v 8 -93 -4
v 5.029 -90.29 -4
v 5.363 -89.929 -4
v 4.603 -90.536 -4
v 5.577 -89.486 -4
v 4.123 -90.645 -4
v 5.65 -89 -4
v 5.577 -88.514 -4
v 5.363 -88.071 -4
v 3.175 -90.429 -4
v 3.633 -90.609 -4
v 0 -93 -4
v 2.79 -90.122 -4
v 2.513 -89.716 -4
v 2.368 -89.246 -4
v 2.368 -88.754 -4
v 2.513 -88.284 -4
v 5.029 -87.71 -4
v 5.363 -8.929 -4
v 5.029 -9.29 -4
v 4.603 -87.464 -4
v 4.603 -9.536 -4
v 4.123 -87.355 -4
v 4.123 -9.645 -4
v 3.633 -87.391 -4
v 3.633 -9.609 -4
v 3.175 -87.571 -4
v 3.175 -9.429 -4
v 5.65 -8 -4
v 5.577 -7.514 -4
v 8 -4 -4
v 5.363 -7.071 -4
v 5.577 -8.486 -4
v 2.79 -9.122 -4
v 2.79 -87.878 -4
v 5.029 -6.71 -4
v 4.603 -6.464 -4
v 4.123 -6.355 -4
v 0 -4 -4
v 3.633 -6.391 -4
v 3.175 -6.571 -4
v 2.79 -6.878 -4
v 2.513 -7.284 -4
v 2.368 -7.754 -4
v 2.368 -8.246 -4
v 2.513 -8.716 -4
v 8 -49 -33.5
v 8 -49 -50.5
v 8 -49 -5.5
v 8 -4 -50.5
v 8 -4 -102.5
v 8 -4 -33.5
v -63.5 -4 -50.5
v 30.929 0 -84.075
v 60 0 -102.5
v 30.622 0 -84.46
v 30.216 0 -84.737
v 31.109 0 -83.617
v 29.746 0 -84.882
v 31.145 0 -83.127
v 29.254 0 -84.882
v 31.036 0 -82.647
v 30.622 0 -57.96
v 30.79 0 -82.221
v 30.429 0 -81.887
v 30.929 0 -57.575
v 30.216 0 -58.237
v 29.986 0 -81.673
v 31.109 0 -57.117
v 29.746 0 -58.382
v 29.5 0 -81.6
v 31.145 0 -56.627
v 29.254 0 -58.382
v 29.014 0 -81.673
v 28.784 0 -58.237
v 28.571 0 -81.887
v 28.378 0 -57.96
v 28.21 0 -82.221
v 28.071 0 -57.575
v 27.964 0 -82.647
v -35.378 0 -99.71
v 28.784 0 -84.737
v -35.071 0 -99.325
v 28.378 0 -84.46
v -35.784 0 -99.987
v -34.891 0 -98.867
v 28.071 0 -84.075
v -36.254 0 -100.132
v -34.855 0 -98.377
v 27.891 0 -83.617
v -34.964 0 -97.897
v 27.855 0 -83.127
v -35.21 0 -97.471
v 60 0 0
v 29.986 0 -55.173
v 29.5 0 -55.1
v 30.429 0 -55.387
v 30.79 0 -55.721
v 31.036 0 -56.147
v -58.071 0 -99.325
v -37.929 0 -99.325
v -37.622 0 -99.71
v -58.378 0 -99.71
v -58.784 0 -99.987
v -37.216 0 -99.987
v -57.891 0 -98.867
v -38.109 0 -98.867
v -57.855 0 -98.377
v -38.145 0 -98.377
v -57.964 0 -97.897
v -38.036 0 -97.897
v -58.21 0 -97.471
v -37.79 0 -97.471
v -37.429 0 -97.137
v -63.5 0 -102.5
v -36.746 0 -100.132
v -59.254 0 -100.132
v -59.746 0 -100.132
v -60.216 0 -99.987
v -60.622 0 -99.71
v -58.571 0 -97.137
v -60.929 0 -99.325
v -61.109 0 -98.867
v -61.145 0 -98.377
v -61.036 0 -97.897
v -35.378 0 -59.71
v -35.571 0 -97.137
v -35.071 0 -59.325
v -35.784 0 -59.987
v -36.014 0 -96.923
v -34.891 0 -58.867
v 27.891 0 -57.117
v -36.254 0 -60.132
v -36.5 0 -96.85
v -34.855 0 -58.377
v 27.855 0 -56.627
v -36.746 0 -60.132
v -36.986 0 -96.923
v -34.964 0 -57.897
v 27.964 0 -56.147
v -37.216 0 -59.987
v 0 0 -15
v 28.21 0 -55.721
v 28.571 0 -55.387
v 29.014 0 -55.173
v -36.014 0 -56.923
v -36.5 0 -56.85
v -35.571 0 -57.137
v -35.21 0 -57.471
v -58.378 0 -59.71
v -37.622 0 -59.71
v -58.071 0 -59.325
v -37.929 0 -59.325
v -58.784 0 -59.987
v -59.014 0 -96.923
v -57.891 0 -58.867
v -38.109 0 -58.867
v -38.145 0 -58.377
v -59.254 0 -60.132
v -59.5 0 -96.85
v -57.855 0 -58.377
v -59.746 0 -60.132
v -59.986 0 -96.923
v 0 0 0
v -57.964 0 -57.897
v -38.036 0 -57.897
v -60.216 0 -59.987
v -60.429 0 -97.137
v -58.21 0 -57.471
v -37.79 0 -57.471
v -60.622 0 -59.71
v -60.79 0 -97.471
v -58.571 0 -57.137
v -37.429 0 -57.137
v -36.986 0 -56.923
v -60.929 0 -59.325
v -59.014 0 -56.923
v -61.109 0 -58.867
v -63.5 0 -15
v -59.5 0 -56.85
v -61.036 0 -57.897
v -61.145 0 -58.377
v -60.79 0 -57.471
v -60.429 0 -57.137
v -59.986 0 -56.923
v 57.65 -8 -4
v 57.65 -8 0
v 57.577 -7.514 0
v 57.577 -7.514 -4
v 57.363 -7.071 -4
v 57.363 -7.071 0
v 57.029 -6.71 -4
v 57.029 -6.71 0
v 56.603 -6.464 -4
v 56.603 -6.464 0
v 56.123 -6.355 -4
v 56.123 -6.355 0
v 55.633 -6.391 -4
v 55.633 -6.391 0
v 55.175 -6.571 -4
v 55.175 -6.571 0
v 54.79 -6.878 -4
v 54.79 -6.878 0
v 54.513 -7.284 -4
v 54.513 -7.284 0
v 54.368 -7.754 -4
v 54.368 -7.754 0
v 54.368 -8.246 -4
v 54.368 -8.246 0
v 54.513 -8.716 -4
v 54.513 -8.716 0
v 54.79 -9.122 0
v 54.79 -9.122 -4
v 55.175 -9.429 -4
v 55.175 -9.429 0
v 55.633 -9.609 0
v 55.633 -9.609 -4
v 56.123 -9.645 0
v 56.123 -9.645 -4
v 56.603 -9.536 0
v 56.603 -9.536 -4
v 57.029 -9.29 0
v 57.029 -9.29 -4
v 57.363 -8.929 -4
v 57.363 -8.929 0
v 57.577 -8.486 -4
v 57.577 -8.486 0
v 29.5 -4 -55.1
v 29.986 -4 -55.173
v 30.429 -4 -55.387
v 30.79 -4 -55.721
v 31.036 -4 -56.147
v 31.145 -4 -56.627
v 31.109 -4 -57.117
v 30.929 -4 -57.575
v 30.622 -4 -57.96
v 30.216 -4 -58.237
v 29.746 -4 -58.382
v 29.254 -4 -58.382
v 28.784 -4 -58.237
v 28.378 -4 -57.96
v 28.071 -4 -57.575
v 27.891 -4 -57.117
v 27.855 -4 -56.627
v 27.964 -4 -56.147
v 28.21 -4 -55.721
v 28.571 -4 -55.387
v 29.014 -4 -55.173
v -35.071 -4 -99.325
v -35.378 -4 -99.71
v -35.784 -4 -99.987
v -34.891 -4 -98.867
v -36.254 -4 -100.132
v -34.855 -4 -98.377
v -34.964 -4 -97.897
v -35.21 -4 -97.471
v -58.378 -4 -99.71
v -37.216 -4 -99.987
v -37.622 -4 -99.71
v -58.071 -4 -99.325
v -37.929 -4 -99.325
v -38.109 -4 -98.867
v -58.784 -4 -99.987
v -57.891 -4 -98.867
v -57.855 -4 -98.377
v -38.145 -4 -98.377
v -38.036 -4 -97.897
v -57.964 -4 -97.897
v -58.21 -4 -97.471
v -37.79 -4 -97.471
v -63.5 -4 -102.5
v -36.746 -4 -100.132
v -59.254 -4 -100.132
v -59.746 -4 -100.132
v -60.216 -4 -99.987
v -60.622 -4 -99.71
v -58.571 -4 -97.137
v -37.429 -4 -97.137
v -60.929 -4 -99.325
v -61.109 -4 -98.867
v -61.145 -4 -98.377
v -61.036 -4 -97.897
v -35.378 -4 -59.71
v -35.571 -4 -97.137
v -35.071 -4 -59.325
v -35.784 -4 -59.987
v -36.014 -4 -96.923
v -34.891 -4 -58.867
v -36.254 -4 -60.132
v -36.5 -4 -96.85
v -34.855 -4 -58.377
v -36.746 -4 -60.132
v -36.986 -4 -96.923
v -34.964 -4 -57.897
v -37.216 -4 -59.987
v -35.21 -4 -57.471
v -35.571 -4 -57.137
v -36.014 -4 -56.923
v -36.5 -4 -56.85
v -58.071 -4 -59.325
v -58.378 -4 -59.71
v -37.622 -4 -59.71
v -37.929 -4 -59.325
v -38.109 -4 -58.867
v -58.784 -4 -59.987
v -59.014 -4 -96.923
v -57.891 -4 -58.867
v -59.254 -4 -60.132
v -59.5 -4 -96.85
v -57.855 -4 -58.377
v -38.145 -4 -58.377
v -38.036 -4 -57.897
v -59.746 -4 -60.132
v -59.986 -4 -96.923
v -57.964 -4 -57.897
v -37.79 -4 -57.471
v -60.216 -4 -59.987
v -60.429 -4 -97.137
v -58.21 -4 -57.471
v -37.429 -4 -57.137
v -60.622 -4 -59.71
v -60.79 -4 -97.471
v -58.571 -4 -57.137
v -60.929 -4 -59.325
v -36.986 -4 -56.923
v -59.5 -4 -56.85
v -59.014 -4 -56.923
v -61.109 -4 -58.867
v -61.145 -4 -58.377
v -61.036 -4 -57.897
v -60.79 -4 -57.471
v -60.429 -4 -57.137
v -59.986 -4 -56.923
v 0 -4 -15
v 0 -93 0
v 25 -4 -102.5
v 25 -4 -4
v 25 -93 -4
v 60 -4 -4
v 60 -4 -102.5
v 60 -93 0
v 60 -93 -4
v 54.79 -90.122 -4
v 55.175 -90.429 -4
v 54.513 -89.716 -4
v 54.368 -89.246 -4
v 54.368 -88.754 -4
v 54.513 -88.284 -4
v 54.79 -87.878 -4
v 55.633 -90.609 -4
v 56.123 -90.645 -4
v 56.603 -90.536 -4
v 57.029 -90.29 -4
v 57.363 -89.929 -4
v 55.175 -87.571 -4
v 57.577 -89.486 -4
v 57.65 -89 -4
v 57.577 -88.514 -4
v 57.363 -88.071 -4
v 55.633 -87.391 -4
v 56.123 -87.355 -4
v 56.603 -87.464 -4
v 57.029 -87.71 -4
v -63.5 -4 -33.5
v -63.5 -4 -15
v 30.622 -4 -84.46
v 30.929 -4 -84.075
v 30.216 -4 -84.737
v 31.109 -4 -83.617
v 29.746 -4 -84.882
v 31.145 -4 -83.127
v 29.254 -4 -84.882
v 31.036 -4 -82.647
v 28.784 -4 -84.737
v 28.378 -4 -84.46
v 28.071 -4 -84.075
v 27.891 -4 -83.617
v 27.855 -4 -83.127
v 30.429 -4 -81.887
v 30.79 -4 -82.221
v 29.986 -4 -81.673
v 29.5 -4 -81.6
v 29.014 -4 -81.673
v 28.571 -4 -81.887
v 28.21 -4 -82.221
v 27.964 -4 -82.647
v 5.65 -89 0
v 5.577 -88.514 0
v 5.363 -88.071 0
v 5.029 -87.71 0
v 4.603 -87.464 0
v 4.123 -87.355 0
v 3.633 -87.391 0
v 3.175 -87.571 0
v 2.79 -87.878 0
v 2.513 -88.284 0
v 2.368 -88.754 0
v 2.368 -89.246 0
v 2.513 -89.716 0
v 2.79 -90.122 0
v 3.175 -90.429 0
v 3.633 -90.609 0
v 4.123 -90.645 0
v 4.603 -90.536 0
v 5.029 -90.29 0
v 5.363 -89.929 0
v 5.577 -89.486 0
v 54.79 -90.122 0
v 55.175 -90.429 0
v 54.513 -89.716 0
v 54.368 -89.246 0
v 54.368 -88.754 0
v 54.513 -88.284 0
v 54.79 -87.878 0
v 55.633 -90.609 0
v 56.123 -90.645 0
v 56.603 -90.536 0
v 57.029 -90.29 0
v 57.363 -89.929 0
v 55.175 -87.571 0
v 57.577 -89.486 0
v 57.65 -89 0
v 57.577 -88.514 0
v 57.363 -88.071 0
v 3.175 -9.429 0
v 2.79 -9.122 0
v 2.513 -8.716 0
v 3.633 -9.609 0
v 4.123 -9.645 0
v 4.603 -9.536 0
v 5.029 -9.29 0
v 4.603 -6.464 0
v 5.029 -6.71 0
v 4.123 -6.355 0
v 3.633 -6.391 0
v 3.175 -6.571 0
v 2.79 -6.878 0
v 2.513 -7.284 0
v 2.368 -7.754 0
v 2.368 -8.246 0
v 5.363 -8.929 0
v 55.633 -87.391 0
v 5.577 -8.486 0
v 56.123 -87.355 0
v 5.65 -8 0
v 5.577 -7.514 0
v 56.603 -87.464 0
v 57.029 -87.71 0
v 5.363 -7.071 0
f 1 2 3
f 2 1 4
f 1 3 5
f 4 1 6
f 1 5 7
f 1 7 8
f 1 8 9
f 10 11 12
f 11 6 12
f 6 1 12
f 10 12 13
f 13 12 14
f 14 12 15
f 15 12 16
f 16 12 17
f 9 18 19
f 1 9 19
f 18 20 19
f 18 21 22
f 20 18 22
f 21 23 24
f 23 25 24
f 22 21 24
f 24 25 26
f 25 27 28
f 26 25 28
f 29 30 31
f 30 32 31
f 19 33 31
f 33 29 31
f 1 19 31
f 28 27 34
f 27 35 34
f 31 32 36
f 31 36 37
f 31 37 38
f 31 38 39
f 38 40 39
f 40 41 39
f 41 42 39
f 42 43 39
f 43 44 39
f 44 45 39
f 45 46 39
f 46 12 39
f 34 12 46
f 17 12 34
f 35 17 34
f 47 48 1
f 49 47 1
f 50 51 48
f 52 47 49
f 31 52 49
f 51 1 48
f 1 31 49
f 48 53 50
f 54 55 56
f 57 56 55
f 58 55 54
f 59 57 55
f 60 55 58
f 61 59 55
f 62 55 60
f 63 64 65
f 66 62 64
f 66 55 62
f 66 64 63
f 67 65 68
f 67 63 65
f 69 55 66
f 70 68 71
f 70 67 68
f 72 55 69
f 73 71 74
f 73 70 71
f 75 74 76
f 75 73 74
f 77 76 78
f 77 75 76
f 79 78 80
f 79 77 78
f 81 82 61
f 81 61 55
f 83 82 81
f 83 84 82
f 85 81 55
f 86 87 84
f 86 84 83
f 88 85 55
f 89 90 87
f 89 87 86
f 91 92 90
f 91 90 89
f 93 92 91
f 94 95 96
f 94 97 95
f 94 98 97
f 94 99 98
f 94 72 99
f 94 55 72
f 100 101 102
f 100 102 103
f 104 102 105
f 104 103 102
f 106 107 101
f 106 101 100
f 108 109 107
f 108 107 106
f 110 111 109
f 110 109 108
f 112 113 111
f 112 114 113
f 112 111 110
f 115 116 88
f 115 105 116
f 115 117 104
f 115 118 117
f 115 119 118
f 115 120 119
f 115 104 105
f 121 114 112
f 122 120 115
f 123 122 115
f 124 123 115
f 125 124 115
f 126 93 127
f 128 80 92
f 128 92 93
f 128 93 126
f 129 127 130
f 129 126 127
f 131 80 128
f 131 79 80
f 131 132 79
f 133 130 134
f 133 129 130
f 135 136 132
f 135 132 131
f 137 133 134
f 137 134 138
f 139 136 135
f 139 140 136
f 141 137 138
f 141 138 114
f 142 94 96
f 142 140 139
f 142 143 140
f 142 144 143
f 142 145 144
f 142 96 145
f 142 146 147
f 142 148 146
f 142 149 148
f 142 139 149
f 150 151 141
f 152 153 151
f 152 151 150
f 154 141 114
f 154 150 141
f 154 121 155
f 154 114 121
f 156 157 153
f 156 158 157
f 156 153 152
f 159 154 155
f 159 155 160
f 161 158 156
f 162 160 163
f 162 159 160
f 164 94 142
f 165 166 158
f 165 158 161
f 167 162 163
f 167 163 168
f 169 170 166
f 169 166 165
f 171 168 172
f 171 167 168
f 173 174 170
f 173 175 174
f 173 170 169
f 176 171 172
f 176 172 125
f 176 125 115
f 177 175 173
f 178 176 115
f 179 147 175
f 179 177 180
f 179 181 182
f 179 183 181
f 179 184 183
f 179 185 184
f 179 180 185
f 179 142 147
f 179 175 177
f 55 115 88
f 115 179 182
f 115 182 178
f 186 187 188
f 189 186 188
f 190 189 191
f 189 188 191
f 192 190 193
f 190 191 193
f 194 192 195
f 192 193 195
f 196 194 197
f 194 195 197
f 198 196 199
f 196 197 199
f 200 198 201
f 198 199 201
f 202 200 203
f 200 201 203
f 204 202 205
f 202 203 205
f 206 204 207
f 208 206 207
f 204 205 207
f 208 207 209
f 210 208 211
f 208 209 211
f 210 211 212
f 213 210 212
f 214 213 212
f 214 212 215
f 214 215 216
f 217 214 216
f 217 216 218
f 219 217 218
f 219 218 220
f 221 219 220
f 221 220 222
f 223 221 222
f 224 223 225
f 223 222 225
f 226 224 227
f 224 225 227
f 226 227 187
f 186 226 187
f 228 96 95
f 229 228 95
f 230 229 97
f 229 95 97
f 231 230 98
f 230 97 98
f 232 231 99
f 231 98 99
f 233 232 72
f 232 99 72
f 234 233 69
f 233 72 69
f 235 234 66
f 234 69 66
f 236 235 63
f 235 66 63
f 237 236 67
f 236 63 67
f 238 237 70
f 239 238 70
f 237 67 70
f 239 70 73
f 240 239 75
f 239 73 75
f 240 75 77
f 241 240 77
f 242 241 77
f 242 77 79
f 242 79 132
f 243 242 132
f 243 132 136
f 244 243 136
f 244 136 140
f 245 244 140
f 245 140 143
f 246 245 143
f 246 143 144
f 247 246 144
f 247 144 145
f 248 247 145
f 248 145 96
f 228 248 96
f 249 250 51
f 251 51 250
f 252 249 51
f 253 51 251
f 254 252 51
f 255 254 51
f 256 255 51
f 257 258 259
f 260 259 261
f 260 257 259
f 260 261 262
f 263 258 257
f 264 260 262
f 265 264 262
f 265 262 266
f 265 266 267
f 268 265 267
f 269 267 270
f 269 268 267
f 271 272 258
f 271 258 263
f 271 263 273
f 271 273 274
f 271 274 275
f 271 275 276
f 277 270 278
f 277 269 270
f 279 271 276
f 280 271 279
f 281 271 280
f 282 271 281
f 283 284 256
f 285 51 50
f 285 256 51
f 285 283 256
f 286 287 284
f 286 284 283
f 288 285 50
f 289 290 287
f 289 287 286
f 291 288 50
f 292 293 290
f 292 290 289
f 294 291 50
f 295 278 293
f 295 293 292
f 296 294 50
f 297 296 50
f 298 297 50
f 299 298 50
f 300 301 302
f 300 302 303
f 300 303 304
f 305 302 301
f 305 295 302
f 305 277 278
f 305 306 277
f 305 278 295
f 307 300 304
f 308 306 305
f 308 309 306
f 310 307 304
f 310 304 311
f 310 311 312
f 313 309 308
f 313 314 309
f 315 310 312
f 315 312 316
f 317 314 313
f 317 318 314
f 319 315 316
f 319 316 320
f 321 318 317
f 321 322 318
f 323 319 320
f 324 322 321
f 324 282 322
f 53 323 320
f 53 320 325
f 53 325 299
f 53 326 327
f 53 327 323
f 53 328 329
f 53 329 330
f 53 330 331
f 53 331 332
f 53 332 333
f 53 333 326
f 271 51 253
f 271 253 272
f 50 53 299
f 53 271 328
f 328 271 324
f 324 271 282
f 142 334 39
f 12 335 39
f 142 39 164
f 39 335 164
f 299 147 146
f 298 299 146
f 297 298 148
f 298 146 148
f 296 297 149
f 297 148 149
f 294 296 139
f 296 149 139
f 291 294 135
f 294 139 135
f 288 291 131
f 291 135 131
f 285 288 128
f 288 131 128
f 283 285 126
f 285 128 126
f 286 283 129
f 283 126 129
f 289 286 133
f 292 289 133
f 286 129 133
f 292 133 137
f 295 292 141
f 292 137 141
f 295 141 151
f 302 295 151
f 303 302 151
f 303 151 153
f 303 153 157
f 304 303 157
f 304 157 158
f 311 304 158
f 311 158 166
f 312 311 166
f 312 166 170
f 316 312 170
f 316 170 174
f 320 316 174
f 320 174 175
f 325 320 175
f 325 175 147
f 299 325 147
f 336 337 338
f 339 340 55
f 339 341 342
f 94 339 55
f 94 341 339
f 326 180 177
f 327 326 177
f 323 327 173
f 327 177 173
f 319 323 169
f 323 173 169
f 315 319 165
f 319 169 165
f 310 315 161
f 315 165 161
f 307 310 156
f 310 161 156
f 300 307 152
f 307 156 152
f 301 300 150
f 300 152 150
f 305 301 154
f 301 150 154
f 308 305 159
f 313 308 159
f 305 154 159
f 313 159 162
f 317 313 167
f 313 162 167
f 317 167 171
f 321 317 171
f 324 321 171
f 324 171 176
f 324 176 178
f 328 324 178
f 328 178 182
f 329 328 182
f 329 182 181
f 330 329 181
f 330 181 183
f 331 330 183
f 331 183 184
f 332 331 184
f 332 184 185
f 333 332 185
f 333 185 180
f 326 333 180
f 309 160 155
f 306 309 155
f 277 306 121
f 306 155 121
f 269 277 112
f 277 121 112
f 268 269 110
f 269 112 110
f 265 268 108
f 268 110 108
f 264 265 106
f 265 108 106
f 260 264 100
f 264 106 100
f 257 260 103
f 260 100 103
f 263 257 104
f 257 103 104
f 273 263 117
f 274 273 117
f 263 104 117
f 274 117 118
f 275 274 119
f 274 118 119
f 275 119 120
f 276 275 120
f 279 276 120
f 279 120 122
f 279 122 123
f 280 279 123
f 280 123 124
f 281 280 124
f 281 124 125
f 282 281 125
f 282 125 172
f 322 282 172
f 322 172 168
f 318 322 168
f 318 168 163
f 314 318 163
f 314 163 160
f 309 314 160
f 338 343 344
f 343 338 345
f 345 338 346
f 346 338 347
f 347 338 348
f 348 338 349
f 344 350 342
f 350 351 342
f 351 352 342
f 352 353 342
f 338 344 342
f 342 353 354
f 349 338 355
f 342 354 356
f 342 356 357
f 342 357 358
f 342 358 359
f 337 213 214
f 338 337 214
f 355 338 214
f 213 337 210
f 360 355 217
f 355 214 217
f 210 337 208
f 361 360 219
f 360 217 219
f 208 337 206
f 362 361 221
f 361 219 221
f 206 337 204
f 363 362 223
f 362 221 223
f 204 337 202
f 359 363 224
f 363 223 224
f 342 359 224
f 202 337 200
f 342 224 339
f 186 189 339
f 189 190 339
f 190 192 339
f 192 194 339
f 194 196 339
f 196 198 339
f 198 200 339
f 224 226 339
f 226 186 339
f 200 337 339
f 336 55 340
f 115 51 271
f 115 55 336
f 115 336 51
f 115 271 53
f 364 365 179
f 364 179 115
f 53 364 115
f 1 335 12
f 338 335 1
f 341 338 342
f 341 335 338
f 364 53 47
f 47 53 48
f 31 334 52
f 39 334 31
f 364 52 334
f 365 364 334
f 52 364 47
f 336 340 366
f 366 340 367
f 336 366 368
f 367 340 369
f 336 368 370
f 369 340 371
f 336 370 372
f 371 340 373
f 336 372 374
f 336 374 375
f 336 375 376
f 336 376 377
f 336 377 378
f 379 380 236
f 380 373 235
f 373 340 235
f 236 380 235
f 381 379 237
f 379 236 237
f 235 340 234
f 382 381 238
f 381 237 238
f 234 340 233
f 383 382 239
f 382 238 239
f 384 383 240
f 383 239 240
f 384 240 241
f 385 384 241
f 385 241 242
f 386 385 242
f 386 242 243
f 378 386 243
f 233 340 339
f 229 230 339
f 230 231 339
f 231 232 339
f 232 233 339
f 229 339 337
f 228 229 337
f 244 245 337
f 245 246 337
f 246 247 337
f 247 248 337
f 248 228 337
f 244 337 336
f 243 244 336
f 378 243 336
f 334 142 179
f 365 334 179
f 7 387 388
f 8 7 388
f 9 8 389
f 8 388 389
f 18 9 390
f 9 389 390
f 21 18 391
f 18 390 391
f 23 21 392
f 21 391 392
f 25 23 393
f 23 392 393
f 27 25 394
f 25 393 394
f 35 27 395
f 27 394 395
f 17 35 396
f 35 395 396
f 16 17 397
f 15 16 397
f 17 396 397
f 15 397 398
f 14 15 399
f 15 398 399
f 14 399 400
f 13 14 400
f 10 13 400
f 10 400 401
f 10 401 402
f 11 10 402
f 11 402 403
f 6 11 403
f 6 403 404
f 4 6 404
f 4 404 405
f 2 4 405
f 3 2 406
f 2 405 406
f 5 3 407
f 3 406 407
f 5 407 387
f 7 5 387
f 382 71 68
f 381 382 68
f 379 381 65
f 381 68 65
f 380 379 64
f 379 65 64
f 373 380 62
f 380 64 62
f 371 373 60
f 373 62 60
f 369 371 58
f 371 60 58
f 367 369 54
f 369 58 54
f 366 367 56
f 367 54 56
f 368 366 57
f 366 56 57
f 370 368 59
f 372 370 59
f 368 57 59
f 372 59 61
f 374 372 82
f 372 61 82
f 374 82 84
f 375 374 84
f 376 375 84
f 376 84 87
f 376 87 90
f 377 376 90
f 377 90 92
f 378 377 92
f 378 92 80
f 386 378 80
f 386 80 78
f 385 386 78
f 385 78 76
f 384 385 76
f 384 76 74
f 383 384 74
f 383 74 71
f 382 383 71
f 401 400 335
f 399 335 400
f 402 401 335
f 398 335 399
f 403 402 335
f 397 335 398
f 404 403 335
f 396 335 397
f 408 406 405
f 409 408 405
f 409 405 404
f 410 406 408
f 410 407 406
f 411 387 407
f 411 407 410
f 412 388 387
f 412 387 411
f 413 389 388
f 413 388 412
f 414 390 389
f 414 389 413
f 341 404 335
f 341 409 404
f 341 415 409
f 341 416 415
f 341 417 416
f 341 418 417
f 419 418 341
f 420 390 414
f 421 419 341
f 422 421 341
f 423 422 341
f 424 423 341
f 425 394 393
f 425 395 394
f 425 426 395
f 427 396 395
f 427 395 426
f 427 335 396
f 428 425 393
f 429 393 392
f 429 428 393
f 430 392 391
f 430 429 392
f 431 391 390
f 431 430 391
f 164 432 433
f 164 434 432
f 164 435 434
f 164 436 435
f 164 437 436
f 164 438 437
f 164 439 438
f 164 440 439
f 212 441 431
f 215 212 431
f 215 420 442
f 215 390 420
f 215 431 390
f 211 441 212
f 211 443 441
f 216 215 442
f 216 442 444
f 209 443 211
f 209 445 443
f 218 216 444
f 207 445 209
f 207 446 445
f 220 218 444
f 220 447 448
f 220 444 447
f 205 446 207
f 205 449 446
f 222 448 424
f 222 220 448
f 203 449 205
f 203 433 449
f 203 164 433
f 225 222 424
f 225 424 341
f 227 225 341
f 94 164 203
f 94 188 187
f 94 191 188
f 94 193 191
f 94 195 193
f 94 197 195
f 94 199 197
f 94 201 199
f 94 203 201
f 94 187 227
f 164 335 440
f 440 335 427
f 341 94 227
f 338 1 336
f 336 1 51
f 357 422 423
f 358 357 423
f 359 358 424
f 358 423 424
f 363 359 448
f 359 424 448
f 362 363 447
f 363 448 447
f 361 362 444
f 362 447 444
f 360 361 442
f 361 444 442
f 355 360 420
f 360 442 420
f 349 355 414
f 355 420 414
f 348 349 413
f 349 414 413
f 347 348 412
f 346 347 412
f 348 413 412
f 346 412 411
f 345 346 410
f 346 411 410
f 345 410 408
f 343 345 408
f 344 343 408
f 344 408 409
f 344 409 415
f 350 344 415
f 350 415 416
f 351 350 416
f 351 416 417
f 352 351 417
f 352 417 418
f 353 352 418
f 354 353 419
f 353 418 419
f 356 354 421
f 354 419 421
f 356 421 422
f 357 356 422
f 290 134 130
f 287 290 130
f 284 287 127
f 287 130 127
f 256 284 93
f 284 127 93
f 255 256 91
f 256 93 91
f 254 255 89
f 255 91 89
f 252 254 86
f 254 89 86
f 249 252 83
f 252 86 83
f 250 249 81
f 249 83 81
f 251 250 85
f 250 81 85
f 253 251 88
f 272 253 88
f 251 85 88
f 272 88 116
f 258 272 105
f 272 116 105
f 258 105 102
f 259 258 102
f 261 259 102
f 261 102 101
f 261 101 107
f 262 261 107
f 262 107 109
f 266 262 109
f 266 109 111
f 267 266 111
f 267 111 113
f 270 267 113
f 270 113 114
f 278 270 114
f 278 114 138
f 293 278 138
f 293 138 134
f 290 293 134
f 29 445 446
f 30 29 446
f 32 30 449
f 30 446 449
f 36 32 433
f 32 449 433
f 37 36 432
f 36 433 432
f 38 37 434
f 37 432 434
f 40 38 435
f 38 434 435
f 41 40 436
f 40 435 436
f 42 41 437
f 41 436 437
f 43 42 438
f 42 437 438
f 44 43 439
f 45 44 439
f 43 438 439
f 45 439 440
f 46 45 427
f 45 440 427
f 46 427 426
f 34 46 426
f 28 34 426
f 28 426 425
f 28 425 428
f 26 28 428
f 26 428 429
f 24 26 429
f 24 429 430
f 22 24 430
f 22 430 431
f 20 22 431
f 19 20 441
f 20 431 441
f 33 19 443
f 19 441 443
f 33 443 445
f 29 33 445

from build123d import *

# Parameters (mm, degrees)
SKETCH1_W           = 60
SKETCH1_H           = 93
BOSS_EXTRUDE1_DEPTH = 4
SKETCH3_R           = 1.65
CUT_EXTRUDE1_DEPTH  = 4
SKETCH5_W           = 60
SKETCH5_H           = 4
BOSS_EXTRUDE2_DEPTH = 11
SKETCH6_W           = 123.5
SKETCH6_H           = 4
BOSS_EXTRUDE3_DEPTH = 87.5
SKETCH7_R           = 1.65
CUT_EXTRUDE2_DEPTH  = 87.5
SKETCH10_R          = 1.65
CUT_EXTRUDE3_DEPTH  = 10
SKETCH11_W          = 98.5
SKETCH11_H          = 89
BOSS_EXTRUDE4_DEPTH = 25
SKETCH13_W          = 98.5
SKETCH13_H          = 89
CUT_EXTRUDE5_DEPTH  = 8
CUT_EXTRUDE7_DEPTH  = 20
SKETCH15_W          = 71.5
SKETCH15_H          = 17
BOSS_EXTRUDE6_DEPTH = 45
CUT_EXTRUDE9_DEPTH  = 45


with BuildPart() as part:
    # Sketch1 → Boss-Extrude1 (new body)
    with BuildSketch(Plane.XY):
        with Locations((30, -46.5)):
            Rectangle(SKETCH1_W, SKETCH1_H)
    extrude(amount=-BOSS_EXTRUDE1_DEPTH)

    # Sketch3 → Cut-Extrude1 (cut)
    with BuildSketch(Plane.XY):
        with Locations((4, -8)):
            Circle(SKETCH3_R)
        with Locations((56, -8)):
            Circle(SKETCH3_R)
        with Locations((4, -89)):
            Circle(SKETCH3_R)
        with Locations((56, -89)):
            Circle(SKETCH3_R)
    extrude(amount=-CUT_EXTRUDE1_DEPTH, mode=Mode.SUBTRACT)

    # Sketch5 → Boss-Extrude2 (add)
    with BuildSketch(Plane(origin=(0, 0, -4), x_dir=(-1, 0, 0), z_dir=(0, 0, -1))):
        with Locations((-30, -2)):
            Rectangle(SKETCH5_W, SKETCH5_H)
    extrude(amount=BOSS_EXTRUDE2_DEPTH)

    # Sketch6 → Boss-Extrude3 (add)
    with BuildSketch(Plane(origin=(0, 0, -15), x_dir=(-1, 0, 0), z_dir=(0, 0, -1))):
        with Locations((1.75, -2)):
            Rectangle(SKETCH6_W, SKETCH6_H)
    extrude(amount=BOSS_EXTRUDE3_DEPTH)

    # Sketch7 → Cut-Extrude2 (cut)
    with BuildSketch(Plane(origin=(0, 0, 0), x_dir=(1, 0, 0), z_dir=(0, 1, 0))):
        with Locations(Location((-59.5, 98.5, 0), (0, 0, 270))):
            Circle(SKETCH7_R)
        with Locations(Location((-36.5, 98.5, 0), (0, 0, 270))):
            Circle(SKETCH7_R)
        with Locations(Location((-59.5, 58.5, 0), (0, 0, 270))):
            Circle(SKETCH7_R)
        with Locations(Location((-36.5, 58.5, 0), (0, 0, 270))):
            Circle(SKETCH7_R)
    extrude(amount=-CUT_EXTRUDE2_DEPTH, mode=Mode.SUBTRACT)

    # Sketch10 → Cut-Extrude3 (cut)
    with BuildSketch(Plane(origin=(0, 0, 0), x_dir=(1, 0, 0), z_dir=(0, 1, 0))):
        with Locations(Location((29.5, 83.25, 0), (0, 0, 270))):
            Circle(SKETCH10_R)
        with Locations(Location((29.5, 56.75, 0), (0, 0, 270))):
            Circle(SKETCH10_R)
    extrude(amount=-CUT_EXTRUDE3_DEPTH, mode=Mode.SUBTRACT)

    # Sketch11 → Boss-Extrude4 (add)
    with BuildSketch(Plane(origin=(0, 0, 0), x_dir=(0, 0, -1), z_dir=(1, 0, 0))):
        with Locations((53.25, -48.5)):
            Rectangle(SKETCH11_W, SKETCH11_H)
    extrude(amount=BOSS_EXTRUDE4_DEPTH)

    # Sketch13 → Cut-Extrude5 (cut)
    with BuildSketch(Plane.ZY):
        with Locations((-53.25, -48.5)):
            Rectangle(SKETCH13_W, SKETCH13_H)
    extrude(amount=-CUT_EXTRUDE5_DEPTH, mode=Mode.SUBTRACT)

    # Sketch14 → Cut-Extrude7 (cut)
    with BuildSketch(Plane.ZY.offset(-8)):
        Polygon((-102.5, -4), (-102.5, -93), (-4, -93), align=None)
    extrude(amount=-CUT_EXTRUDE7_DEPTH, mode=Mode.SUBTRACT)

    # Sketch15 → Boss-Extrude6 (add)
    with BuildSketch(Plane.XZ.offset(4)):
        with Locations((-27.75, -42)):
            Rectangle(SKETCH15_W, SKETCH15_H)
    extrude(amount=BOSS_EXTRUDE6_DEPTH)

    # Sketch16 → Cut-Extrude9 (cut)
    with BuildSketch(Plane(origin=(0, 0, -50.5), x_dir=(-1, 0, 0), z_dir=(0, 0, -1))):
        Polygon((63.5, -4), (-8, -49), (63.5, -49), align=None)
    extrude(amount=-CUT_EXTRUDE9_DEPTH, mode=Mode.SUBTRACT)


solid = part.part
